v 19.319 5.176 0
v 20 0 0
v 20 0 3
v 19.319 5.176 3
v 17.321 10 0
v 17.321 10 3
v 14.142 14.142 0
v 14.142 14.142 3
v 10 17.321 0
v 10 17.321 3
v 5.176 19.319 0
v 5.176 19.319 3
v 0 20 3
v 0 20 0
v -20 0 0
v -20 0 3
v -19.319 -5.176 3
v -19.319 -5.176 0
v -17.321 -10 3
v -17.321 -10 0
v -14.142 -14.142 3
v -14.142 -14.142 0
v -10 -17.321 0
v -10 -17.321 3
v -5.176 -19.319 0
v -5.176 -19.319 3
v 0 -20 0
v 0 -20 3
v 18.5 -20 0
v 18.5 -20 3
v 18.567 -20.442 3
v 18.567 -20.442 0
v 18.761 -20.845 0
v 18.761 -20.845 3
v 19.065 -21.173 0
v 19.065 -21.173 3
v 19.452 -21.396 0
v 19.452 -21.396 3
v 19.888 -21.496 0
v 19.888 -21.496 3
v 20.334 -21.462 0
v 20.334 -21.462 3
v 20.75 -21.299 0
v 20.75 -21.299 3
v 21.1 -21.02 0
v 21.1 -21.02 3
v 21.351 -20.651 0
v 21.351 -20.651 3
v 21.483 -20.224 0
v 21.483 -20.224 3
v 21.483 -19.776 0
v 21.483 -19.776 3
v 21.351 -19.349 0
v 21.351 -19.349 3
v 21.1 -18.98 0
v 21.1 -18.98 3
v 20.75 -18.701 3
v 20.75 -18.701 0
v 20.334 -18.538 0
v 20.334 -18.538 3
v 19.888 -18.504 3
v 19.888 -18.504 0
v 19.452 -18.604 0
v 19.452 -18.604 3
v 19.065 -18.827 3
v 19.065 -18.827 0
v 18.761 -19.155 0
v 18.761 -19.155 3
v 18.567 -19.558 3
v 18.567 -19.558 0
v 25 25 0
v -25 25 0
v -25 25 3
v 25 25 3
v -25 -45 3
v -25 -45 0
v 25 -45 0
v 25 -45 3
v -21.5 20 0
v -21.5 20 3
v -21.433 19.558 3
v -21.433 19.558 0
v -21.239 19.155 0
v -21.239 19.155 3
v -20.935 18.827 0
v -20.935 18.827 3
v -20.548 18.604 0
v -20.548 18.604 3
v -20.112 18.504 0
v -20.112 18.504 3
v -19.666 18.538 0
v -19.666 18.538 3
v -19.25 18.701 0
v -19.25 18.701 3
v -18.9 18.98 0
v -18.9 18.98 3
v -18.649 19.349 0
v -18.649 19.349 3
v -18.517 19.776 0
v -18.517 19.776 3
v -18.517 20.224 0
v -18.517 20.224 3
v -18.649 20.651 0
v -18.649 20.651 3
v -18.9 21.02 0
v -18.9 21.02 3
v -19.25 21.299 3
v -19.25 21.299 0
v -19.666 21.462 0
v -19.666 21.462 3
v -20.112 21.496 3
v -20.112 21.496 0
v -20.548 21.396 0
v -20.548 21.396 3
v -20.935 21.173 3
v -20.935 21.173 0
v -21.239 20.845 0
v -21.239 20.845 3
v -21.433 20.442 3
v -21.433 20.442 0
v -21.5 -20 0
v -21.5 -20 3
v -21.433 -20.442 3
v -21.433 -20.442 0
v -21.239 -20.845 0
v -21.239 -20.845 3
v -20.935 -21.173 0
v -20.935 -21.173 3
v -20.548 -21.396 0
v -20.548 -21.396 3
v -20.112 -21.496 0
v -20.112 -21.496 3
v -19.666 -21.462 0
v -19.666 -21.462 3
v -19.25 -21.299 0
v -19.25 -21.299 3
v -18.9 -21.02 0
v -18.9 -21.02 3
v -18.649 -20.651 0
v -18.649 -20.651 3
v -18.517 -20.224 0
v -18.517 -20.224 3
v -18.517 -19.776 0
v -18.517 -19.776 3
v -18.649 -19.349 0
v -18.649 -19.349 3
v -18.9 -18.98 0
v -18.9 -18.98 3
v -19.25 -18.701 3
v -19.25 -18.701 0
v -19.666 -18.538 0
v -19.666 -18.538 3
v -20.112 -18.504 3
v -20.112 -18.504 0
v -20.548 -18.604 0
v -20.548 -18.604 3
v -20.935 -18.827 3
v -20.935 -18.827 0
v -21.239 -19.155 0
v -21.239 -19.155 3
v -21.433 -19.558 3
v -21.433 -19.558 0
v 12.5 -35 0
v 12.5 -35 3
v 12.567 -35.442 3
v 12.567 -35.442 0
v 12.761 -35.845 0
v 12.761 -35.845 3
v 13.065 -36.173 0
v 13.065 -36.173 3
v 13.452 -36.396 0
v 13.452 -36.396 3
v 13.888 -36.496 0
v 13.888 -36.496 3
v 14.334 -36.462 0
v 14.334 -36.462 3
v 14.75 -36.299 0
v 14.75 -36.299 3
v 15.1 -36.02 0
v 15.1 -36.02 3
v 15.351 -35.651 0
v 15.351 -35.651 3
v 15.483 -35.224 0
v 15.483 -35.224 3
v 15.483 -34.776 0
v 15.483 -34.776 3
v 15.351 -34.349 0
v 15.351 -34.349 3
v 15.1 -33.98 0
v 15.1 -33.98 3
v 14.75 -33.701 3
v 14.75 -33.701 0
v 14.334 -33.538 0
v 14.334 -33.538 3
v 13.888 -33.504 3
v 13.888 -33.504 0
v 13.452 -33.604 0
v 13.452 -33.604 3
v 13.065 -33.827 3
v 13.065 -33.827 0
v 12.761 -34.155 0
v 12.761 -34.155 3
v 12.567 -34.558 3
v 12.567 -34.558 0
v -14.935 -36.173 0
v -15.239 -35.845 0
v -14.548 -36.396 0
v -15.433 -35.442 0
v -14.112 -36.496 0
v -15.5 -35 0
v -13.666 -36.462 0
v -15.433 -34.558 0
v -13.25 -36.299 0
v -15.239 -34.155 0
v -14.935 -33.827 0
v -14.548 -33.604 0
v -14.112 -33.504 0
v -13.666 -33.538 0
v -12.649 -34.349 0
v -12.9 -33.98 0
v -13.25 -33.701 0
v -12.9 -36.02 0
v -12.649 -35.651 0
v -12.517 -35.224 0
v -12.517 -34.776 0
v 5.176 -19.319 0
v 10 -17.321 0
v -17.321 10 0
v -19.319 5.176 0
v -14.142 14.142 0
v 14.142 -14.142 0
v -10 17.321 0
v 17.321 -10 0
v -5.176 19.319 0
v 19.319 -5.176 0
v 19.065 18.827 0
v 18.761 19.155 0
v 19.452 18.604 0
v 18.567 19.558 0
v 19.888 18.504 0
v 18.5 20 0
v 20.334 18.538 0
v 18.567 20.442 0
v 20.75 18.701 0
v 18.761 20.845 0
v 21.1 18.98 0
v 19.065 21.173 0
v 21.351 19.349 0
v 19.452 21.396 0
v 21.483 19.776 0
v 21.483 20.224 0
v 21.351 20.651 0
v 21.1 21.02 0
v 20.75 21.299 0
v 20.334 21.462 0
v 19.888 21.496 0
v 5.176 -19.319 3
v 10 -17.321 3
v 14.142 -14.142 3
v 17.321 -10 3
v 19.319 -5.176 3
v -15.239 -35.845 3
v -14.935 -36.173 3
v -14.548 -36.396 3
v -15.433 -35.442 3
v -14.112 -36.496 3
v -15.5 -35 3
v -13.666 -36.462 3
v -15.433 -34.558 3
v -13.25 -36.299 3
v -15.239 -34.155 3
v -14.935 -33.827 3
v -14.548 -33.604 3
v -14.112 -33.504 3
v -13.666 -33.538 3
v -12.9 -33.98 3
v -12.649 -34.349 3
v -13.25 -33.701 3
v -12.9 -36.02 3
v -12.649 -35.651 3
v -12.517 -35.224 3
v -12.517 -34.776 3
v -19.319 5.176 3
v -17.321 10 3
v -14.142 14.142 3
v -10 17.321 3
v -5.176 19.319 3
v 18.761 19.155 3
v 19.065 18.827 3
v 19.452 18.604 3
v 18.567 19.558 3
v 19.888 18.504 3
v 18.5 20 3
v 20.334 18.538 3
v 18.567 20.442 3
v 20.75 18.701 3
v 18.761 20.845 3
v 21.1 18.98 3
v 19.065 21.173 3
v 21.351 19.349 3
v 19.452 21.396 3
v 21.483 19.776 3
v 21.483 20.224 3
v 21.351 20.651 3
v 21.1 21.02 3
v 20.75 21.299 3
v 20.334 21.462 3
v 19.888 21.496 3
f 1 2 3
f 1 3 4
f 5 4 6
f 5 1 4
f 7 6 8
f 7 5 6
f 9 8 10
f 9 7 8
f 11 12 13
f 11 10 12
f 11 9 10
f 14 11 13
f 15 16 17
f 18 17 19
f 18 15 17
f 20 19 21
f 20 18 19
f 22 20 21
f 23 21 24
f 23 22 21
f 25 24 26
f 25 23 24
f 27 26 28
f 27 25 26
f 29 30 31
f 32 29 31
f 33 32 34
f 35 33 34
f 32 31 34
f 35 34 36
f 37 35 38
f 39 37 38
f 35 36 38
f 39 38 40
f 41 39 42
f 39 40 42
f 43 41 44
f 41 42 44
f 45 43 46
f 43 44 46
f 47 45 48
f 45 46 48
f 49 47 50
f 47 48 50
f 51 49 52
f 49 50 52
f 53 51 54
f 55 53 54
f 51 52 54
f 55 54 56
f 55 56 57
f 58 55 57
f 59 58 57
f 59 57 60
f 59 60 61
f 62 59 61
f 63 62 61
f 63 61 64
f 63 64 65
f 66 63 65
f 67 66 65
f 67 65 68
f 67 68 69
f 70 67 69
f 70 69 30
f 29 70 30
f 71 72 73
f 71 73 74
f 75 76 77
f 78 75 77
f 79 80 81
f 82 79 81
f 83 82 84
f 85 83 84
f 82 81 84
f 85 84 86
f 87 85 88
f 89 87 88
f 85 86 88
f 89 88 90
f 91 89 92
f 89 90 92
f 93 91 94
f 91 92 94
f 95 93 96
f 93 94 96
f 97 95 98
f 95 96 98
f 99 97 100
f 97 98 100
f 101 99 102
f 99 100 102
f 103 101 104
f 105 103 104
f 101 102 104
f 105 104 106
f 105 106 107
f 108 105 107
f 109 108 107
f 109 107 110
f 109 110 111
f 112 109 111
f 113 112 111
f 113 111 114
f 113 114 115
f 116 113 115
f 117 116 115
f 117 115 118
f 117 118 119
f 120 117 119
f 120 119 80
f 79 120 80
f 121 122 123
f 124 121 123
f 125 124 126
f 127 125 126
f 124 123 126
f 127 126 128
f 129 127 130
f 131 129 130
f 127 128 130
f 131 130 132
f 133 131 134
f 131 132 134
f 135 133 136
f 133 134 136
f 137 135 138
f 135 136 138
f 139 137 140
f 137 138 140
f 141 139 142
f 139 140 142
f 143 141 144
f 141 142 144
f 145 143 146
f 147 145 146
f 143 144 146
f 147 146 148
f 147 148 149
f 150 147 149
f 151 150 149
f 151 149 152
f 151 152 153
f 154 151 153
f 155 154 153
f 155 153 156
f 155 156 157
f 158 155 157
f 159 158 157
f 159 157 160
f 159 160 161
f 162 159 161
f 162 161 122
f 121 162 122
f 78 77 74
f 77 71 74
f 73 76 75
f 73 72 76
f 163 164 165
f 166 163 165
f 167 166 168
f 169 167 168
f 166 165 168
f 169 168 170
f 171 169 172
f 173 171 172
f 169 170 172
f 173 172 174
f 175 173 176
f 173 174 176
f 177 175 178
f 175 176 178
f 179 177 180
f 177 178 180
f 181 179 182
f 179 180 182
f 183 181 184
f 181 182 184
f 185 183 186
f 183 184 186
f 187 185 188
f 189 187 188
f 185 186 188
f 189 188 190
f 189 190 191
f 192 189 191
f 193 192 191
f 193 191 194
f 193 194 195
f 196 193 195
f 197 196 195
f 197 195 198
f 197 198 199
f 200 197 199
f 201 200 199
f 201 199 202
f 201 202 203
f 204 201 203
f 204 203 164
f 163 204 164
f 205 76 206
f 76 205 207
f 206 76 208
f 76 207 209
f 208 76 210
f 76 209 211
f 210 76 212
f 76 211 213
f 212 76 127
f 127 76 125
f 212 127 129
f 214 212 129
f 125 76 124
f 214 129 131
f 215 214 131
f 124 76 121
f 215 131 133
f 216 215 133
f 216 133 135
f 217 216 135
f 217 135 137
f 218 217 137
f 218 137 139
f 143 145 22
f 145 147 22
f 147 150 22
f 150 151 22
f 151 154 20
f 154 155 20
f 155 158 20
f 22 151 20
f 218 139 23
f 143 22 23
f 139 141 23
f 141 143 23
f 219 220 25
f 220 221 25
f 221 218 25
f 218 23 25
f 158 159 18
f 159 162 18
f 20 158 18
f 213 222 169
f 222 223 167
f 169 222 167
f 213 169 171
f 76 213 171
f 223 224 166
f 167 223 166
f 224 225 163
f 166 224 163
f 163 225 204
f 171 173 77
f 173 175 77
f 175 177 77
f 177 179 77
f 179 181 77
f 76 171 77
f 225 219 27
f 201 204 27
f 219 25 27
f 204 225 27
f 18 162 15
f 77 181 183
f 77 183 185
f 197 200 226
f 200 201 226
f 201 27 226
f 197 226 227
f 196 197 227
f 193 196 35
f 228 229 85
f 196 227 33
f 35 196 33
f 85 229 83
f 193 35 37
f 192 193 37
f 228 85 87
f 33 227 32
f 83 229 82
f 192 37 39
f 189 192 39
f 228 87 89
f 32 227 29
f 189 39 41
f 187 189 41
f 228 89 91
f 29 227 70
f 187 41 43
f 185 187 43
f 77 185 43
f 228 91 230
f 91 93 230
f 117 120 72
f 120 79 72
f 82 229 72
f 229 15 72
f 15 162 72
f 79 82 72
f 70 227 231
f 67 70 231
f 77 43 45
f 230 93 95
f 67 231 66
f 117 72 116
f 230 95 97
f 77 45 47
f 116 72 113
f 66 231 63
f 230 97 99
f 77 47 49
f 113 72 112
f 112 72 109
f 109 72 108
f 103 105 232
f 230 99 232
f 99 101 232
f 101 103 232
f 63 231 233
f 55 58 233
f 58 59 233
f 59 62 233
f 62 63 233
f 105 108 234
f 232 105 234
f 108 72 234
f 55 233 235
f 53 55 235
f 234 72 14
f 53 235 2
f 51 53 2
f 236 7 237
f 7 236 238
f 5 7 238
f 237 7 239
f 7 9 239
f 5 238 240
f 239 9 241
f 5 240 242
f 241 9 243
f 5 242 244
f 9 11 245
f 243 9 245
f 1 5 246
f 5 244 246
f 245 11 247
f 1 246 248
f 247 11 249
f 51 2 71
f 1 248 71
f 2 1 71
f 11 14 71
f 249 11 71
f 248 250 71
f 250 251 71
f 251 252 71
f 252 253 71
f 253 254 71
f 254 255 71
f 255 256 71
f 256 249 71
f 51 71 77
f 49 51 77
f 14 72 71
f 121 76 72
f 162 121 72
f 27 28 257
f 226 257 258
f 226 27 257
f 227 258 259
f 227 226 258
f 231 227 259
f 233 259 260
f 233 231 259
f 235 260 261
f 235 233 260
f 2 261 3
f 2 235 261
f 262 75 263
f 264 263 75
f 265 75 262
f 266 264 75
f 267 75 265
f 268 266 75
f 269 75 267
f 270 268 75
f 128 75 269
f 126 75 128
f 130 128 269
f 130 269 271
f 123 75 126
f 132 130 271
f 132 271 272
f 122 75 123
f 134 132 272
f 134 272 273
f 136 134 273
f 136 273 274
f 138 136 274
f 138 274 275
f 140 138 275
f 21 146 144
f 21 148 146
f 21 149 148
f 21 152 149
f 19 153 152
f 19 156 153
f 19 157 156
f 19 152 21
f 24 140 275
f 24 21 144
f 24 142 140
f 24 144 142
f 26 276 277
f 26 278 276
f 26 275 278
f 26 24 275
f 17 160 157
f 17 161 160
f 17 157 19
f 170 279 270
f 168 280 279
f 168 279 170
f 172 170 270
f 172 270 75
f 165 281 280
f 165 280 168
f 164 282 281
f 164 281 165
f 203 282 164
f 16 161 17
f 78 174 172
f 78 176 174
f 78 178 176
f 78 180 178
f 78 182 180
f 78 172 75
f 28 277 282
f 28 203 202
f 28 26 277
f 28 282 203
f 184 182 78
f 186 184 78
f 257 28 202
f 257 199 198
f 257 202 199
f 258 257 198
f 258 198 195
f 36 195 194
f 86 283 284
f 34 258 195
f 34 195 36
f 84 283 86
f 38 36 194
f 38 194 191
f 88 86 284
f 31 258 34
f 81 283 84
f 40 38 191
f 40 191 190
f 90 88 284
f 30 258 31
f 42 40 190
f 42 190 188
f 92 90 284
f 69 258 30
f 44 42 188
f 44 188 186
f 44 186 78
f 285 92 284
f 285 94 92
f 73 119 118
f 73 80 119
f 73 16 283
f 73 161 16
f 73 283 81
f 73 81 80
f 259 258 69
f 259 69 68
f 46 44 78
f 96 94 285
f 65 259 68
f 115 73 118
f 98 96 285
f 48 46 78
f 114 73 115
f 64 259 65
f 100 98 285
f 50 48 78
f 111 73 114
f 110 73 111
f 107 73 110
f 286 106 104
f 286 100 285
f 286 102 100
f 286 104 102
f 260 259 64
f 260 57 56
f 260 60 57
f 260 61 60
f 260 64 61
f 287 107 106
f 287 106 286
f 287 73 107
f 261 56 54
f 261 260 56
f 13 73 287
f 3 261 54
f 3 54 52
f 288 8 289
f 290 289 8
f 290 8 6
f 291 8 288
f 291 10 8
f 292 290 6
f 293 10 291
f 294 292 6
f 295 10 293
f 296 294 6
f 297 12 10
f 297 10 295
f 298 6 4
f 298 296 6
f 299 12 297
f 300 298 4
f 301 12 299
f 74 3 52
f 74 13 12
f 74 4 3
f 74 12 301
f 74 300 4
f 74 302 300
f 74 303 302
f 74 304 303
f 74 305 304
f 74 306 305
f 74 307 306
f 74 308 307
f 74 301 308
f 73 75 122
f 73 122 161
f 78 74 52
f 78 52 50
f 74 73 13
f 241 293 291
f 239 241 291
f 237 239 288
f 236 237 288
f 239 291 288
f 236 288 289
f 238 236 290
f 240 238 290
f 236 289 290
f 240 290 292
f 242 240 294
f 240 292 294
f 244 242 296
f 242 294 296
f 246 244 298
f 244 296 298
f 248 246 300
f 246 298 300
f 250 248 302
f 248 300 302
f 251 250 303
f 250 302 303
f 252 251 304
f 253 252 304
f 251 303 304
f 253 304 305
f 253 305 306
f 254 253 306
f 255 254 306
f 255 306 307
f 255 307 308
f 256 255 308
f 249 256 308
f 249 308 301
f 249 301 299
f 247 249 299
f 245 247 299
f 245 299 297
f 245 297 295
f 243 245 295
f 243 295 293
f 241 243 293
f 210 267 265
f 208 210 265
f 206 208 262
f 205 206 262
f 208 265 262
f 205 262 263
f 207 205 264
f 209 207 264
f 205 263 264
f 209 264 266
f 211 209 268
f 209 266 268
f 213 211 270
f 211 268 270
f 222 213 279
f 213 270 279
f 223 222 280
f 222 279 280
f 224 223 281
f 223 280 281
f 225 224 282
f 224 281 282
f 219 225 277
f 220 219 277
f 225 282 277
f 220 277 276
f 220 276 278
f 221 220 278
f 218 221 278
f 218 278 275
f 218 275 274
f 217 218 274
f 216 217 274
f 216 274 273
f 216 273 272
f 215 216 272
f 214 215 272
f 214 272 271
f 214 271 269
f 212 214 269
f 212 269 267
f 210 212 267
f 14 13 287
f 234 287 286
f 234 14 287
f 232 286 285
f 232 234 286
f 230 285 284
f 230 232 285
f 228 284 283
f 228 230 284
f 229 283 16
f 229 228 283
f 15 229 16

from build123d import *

# Parameters (mm, degrees)
F0_W     = 50
F0_H     = 50
F0_W_2   = 40
F0_H_2   = 40
F1_DEPTH = 3
F2_D     = 3
F3_DEPTH = 20
F5_D     = 3
F7_DEPTH = 25


with BuildPart() as f1:
    # F0 (on Top) → F1 (new body)
    with BuildSketch(Plane.XY):
        Rectangle(F0_W, F0_H)
        Rectangle(F0_W_2, F0_H_2, mode=Mode.SUBTRACT)
        Rectangle(F0_W_2, F0_H_2)
    extrude(amount=F1_DEPTH)

    # F2 (through all)
    with Locations(Plane(origin=(0, 0, 0), x_dir=(1, 0, 0), z_dir=(0, 0, -1))):
        with Locations((-20, 20), (20, 20), (20, -20), (-20, -20)):
            Hole(F2_D / 2)

    # F3 (add): a face of the model
    f3_faces = [f1.faces().sort_by_distance(p)[0] for p in [
        (0, -25, 1.5),
    ]]
    extrude(f3_faces, amount=F3_DEPTH)

    # F5 (through all)
    with Locations(Plane(origin=(0, 0, 0), x_dir=(1, 0, 0), z_dir=(0, 0, -1))):
        with Locations((14, 35), (-14, 35)):
            Hole(F5_D / 2)

    # F6 (on face) → F7 (cut)
    with BuildSketch(Plane.XY):
        with BuildLine():
            ThreePointArc((0, -20), (14.1421356237, -14.1421356237), (20, 0))
            ThreePointArc((20, 0), (14.142135611, 14.1421356364), (-3.59e-08, 20))
            ThreePointArc((-3.59e-08, 20), (-14.1421356364, 14.142135611), (-20, 0))
            ThreePointArc((-20, 0), (-14.1421356237, -14.1421356237), (0, -20))
        make_face()
    extrude(amount=F7_DEPTH, mode=Mode.SUBTRACT)


solid = f1.part
